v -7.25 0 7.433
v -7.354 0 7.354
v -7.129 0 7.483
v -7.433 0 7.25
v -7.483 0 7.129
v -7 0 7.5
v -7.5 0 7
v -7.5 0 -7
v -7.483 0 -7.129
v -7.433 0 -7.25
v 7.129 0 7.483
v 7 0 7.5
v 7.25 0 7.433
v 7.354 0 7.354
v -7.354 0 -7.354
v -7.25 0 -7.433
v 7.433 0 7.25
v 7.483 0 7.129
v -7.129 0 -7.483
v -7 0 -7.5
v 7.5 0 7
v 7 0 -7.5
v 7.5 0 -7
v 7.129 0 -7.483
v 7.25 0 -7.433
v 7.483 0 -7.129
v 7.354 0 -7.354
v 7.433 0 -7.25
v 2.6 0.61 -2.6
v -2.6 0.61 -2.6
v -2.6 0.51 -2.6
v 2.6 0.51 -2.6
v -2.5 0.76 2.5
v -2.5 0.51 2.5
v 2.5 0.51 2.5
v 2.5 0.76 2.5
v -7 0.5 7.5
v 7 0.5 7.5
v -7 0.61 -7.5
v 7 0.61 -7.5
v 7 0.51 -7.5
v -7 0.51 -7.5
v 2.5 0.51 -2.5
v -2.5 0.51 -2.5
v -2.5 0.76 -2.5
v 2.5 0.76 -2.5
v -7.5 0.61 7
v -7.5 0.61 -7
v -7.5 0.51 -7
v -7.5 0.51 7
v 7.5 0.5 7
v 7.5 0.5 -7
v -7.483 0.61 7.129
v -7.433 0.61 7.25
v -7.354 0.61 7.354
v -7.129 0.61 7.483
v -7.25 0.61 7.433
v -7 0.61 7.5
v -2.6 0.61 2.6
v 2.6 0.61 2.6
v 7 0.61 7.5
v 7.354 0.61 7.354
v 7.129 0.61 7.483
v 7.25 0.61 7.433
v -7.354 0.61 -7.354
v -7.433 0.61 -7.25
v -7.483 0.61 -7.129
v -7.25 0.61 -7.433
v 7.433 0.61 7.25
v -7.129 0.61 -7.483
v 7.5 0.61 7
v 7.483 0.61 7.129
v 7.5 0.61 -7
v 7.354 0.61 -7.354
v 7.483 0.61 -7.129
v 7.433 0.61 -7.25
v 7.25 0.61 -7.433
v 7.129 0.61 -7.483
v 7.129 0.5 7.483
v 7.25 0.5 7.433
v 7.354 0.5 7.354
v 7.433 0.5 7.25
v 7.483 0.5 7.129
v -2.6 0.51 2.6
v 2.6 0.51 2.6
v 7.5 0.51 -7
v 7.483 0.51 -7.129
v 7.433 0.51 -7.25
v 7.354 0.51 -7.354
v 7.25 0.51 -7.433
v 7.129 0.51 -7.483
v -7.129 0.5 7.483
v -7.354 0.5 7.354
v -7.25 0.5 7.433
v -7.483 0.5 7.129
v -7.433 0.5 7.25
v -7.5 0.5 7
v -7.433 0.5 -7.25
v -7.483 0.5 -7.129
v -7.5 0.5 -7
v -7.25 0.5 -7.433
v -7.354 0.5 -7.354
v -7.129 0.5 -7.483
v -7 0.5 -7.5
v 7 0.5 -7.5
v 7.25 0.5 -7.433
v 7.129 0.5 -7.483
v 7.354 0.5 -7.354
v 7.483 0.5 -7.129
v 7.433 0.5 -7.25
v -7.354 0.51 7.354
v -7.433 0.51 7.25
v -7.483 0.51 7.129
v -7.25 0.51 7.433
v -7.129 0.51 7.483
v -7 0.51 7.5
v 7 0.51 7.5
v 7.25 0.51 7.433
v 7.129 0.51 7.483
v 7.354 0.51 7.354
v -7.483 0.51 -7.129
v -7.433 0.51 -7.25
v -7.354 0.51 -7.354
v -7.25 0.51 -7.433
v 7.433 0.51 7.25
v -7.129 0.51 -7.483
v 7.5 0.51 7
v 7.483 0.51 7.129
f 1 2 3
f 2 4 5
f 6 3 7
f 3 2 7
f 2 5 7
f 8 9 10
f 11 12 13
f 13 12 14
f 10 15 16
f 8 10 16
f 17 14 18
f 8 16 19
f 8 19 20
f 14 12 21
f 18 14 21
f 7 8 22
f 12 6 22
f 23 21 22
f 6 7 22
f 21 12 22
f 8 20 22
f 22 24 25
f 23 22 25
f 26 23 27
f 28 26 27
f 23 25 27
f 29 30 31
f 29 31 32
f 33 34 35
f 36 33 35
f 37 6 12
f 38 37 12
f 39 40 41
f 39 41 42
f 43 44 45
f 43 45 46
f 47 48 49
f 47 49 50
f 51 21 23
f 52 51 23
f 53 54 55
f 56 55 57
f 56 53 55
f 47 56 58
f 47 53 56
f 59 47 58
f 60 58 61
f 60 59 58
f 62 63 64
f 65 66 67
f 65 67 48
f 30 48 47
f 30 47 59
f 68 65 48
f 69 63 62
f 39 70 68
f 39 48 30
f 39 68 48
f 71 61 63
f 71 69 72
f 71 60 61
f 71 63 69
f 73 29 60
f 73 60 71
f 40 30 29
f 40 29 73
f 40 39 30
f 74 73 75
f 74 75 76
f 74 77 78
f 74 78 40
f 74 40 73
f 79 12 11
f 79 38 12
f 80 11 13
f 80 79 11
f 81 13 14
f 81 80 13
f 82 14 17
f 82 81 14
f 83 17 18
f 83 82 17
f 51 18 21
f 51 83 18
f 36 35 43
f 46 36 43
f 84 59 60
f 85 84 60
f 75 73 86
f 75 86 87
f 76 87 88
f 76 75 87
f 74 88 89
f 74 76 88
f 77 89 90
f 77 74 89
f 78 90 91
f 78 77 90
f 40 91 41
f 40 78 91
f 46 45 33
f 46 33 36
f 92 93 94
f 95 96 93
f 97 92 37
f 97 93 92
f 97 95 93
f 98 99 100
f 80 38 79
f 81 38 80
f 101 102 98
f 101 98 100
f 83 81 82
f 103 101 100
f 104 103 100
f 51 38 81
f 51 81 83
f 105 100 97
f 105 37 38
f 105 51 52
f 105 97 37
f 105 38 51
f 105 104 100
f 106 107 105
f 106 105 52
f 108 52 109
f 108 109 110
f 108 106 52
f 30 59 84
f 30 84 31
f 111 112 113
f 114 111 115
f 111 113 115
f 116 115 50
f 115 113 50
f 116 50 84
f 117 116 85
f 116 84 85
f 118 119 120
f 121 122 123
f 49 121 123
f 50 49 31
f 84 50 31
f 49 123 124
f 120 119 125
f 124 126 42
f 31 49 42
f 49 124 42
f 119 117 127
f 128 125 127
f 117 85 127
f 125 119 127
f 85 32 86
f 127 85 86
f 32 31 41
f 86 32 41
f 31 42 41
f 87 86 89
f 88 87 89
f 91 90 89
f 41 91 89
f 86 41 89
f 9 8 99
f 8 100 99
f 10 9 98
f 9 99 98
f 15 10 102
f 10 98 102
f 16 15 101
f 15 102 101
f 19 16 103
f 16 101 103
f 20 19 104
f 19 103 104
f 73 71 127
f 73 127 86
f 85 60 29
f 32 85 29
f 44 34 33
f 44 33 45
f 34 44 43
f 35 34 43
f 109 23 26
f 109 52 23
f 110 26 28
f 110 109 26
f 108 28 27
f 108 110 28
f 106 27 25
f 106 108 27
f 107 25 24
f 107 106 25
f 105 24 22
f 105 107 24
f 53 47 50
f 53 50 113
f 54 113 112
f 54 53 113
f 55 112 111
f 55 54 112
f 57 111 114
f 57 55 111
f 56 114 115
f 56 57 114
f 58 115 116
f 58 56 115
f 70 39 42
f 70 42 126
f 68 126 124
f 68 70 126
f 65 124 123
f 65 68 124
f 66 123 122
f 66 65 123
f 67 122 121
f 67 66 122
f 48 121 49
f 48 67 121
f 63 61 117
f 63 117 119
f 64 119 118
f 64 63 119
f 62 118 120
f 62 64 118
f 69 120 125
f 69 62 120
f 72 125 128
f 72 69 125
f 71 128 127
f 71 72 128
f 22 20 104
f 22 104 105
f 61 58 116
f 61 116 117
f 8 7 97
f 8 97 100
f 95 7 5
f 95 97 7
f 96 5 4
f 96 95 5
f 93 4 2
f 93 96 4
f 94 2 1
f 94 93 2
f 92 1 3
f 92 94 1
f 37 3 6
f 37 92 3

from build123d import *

# Parameters (mm, degrees)
SKETCH_1_W      = 15
SKETCH_1_H      = 15
EXTRUDE_1_DEPTH = 0.5
FILLET_1_R      = 0.5
EXTRUDE_START   = 0.1
SKETCH_2_W      = 5.2
SKETCH_2_H      = 5.2
EXTRUDE_2_DEPTH = 0.1
SKETCH_3_W      = 5
SKETCH_3_H      = 5
EXTRUDE_3_DEPTH = 0.25


with BuildPart() as part:
    # 草图1 → 凸台-拉伸1 (new body)
    with BuildSketch(Plane(origin=(0, 0, 0), x_dir=(1, 0, 0), z_dir=(0, 1, 0))):
        Rectangle(SKETCH_1_W, SKETCH_1_H)
    extrude(amount=EXTRUDE_1_DEPTH)

    # 圆角1
    fillet_1_edges = [part.edges().sort_by_distance(p)[0] for p in [
        (7.5, 0.25, 7.5),
        (-7.5, 0.25, 7.5),
        (-7.5, 0.25, -7.5),
        (7.5, 0.25, -7.5),
    ]]
    fillet(fillet_1_edges, radius=FILLET_1_R)


with BuildPart() as body_2:
    # 草图2 → 凸台-拉伸2 (new body)
    with BuildSketch(Plane(origin=(0, 0.51, 0), x_dir=(1, 0, 0), z_dir=(0, 1, 0)).offset(EXTRUDE_START)):
        with BuildLine():
            Line((-7.5, 7), (-7.5, -7))
            ThreePointArc((-7.5, -7), (-7.353553391, -7.353553391), (-7, -7.5))
            Line((-7, -7.5), (7, -7.5))
            ThreePointArc((7, -7.5), (7.353553391, -7.353553391), (7.5, -7))
            Line((7.5, -7), (7.5, 7))
            ThreePointArc((7.5, 7), (7.353553391, 7.353553391), (7, 7.5))
            Line((7, 7.5), (-7, 7.5))
            ThreePointArc((-7, 7.5), (-7.353553391, 7.353553391), (-7.5, 7))
        make_face()
        Rectangle(SKETCH_2_W, SKETCH_2_H, mode=Mode.SUBTRACT)
    extrude(amount=-EXTRUDE_2_DEPTH)


with BuildPart() as body_3:
    # 草图3 → 凸台-拉伸3 (new body)
    with BuildSketch(Plane(origin=(0, 0.51, 0), x_dir=(1, 0, 0), z_dir=(0, 1, 0))):
        Rectangle(SKETCH_3_W, SKETCH_3_H)
    extrude(amount=EXTRUDE_3_DEPTH)


solid = Compound([part.part, body_2.part, body_3.part])
